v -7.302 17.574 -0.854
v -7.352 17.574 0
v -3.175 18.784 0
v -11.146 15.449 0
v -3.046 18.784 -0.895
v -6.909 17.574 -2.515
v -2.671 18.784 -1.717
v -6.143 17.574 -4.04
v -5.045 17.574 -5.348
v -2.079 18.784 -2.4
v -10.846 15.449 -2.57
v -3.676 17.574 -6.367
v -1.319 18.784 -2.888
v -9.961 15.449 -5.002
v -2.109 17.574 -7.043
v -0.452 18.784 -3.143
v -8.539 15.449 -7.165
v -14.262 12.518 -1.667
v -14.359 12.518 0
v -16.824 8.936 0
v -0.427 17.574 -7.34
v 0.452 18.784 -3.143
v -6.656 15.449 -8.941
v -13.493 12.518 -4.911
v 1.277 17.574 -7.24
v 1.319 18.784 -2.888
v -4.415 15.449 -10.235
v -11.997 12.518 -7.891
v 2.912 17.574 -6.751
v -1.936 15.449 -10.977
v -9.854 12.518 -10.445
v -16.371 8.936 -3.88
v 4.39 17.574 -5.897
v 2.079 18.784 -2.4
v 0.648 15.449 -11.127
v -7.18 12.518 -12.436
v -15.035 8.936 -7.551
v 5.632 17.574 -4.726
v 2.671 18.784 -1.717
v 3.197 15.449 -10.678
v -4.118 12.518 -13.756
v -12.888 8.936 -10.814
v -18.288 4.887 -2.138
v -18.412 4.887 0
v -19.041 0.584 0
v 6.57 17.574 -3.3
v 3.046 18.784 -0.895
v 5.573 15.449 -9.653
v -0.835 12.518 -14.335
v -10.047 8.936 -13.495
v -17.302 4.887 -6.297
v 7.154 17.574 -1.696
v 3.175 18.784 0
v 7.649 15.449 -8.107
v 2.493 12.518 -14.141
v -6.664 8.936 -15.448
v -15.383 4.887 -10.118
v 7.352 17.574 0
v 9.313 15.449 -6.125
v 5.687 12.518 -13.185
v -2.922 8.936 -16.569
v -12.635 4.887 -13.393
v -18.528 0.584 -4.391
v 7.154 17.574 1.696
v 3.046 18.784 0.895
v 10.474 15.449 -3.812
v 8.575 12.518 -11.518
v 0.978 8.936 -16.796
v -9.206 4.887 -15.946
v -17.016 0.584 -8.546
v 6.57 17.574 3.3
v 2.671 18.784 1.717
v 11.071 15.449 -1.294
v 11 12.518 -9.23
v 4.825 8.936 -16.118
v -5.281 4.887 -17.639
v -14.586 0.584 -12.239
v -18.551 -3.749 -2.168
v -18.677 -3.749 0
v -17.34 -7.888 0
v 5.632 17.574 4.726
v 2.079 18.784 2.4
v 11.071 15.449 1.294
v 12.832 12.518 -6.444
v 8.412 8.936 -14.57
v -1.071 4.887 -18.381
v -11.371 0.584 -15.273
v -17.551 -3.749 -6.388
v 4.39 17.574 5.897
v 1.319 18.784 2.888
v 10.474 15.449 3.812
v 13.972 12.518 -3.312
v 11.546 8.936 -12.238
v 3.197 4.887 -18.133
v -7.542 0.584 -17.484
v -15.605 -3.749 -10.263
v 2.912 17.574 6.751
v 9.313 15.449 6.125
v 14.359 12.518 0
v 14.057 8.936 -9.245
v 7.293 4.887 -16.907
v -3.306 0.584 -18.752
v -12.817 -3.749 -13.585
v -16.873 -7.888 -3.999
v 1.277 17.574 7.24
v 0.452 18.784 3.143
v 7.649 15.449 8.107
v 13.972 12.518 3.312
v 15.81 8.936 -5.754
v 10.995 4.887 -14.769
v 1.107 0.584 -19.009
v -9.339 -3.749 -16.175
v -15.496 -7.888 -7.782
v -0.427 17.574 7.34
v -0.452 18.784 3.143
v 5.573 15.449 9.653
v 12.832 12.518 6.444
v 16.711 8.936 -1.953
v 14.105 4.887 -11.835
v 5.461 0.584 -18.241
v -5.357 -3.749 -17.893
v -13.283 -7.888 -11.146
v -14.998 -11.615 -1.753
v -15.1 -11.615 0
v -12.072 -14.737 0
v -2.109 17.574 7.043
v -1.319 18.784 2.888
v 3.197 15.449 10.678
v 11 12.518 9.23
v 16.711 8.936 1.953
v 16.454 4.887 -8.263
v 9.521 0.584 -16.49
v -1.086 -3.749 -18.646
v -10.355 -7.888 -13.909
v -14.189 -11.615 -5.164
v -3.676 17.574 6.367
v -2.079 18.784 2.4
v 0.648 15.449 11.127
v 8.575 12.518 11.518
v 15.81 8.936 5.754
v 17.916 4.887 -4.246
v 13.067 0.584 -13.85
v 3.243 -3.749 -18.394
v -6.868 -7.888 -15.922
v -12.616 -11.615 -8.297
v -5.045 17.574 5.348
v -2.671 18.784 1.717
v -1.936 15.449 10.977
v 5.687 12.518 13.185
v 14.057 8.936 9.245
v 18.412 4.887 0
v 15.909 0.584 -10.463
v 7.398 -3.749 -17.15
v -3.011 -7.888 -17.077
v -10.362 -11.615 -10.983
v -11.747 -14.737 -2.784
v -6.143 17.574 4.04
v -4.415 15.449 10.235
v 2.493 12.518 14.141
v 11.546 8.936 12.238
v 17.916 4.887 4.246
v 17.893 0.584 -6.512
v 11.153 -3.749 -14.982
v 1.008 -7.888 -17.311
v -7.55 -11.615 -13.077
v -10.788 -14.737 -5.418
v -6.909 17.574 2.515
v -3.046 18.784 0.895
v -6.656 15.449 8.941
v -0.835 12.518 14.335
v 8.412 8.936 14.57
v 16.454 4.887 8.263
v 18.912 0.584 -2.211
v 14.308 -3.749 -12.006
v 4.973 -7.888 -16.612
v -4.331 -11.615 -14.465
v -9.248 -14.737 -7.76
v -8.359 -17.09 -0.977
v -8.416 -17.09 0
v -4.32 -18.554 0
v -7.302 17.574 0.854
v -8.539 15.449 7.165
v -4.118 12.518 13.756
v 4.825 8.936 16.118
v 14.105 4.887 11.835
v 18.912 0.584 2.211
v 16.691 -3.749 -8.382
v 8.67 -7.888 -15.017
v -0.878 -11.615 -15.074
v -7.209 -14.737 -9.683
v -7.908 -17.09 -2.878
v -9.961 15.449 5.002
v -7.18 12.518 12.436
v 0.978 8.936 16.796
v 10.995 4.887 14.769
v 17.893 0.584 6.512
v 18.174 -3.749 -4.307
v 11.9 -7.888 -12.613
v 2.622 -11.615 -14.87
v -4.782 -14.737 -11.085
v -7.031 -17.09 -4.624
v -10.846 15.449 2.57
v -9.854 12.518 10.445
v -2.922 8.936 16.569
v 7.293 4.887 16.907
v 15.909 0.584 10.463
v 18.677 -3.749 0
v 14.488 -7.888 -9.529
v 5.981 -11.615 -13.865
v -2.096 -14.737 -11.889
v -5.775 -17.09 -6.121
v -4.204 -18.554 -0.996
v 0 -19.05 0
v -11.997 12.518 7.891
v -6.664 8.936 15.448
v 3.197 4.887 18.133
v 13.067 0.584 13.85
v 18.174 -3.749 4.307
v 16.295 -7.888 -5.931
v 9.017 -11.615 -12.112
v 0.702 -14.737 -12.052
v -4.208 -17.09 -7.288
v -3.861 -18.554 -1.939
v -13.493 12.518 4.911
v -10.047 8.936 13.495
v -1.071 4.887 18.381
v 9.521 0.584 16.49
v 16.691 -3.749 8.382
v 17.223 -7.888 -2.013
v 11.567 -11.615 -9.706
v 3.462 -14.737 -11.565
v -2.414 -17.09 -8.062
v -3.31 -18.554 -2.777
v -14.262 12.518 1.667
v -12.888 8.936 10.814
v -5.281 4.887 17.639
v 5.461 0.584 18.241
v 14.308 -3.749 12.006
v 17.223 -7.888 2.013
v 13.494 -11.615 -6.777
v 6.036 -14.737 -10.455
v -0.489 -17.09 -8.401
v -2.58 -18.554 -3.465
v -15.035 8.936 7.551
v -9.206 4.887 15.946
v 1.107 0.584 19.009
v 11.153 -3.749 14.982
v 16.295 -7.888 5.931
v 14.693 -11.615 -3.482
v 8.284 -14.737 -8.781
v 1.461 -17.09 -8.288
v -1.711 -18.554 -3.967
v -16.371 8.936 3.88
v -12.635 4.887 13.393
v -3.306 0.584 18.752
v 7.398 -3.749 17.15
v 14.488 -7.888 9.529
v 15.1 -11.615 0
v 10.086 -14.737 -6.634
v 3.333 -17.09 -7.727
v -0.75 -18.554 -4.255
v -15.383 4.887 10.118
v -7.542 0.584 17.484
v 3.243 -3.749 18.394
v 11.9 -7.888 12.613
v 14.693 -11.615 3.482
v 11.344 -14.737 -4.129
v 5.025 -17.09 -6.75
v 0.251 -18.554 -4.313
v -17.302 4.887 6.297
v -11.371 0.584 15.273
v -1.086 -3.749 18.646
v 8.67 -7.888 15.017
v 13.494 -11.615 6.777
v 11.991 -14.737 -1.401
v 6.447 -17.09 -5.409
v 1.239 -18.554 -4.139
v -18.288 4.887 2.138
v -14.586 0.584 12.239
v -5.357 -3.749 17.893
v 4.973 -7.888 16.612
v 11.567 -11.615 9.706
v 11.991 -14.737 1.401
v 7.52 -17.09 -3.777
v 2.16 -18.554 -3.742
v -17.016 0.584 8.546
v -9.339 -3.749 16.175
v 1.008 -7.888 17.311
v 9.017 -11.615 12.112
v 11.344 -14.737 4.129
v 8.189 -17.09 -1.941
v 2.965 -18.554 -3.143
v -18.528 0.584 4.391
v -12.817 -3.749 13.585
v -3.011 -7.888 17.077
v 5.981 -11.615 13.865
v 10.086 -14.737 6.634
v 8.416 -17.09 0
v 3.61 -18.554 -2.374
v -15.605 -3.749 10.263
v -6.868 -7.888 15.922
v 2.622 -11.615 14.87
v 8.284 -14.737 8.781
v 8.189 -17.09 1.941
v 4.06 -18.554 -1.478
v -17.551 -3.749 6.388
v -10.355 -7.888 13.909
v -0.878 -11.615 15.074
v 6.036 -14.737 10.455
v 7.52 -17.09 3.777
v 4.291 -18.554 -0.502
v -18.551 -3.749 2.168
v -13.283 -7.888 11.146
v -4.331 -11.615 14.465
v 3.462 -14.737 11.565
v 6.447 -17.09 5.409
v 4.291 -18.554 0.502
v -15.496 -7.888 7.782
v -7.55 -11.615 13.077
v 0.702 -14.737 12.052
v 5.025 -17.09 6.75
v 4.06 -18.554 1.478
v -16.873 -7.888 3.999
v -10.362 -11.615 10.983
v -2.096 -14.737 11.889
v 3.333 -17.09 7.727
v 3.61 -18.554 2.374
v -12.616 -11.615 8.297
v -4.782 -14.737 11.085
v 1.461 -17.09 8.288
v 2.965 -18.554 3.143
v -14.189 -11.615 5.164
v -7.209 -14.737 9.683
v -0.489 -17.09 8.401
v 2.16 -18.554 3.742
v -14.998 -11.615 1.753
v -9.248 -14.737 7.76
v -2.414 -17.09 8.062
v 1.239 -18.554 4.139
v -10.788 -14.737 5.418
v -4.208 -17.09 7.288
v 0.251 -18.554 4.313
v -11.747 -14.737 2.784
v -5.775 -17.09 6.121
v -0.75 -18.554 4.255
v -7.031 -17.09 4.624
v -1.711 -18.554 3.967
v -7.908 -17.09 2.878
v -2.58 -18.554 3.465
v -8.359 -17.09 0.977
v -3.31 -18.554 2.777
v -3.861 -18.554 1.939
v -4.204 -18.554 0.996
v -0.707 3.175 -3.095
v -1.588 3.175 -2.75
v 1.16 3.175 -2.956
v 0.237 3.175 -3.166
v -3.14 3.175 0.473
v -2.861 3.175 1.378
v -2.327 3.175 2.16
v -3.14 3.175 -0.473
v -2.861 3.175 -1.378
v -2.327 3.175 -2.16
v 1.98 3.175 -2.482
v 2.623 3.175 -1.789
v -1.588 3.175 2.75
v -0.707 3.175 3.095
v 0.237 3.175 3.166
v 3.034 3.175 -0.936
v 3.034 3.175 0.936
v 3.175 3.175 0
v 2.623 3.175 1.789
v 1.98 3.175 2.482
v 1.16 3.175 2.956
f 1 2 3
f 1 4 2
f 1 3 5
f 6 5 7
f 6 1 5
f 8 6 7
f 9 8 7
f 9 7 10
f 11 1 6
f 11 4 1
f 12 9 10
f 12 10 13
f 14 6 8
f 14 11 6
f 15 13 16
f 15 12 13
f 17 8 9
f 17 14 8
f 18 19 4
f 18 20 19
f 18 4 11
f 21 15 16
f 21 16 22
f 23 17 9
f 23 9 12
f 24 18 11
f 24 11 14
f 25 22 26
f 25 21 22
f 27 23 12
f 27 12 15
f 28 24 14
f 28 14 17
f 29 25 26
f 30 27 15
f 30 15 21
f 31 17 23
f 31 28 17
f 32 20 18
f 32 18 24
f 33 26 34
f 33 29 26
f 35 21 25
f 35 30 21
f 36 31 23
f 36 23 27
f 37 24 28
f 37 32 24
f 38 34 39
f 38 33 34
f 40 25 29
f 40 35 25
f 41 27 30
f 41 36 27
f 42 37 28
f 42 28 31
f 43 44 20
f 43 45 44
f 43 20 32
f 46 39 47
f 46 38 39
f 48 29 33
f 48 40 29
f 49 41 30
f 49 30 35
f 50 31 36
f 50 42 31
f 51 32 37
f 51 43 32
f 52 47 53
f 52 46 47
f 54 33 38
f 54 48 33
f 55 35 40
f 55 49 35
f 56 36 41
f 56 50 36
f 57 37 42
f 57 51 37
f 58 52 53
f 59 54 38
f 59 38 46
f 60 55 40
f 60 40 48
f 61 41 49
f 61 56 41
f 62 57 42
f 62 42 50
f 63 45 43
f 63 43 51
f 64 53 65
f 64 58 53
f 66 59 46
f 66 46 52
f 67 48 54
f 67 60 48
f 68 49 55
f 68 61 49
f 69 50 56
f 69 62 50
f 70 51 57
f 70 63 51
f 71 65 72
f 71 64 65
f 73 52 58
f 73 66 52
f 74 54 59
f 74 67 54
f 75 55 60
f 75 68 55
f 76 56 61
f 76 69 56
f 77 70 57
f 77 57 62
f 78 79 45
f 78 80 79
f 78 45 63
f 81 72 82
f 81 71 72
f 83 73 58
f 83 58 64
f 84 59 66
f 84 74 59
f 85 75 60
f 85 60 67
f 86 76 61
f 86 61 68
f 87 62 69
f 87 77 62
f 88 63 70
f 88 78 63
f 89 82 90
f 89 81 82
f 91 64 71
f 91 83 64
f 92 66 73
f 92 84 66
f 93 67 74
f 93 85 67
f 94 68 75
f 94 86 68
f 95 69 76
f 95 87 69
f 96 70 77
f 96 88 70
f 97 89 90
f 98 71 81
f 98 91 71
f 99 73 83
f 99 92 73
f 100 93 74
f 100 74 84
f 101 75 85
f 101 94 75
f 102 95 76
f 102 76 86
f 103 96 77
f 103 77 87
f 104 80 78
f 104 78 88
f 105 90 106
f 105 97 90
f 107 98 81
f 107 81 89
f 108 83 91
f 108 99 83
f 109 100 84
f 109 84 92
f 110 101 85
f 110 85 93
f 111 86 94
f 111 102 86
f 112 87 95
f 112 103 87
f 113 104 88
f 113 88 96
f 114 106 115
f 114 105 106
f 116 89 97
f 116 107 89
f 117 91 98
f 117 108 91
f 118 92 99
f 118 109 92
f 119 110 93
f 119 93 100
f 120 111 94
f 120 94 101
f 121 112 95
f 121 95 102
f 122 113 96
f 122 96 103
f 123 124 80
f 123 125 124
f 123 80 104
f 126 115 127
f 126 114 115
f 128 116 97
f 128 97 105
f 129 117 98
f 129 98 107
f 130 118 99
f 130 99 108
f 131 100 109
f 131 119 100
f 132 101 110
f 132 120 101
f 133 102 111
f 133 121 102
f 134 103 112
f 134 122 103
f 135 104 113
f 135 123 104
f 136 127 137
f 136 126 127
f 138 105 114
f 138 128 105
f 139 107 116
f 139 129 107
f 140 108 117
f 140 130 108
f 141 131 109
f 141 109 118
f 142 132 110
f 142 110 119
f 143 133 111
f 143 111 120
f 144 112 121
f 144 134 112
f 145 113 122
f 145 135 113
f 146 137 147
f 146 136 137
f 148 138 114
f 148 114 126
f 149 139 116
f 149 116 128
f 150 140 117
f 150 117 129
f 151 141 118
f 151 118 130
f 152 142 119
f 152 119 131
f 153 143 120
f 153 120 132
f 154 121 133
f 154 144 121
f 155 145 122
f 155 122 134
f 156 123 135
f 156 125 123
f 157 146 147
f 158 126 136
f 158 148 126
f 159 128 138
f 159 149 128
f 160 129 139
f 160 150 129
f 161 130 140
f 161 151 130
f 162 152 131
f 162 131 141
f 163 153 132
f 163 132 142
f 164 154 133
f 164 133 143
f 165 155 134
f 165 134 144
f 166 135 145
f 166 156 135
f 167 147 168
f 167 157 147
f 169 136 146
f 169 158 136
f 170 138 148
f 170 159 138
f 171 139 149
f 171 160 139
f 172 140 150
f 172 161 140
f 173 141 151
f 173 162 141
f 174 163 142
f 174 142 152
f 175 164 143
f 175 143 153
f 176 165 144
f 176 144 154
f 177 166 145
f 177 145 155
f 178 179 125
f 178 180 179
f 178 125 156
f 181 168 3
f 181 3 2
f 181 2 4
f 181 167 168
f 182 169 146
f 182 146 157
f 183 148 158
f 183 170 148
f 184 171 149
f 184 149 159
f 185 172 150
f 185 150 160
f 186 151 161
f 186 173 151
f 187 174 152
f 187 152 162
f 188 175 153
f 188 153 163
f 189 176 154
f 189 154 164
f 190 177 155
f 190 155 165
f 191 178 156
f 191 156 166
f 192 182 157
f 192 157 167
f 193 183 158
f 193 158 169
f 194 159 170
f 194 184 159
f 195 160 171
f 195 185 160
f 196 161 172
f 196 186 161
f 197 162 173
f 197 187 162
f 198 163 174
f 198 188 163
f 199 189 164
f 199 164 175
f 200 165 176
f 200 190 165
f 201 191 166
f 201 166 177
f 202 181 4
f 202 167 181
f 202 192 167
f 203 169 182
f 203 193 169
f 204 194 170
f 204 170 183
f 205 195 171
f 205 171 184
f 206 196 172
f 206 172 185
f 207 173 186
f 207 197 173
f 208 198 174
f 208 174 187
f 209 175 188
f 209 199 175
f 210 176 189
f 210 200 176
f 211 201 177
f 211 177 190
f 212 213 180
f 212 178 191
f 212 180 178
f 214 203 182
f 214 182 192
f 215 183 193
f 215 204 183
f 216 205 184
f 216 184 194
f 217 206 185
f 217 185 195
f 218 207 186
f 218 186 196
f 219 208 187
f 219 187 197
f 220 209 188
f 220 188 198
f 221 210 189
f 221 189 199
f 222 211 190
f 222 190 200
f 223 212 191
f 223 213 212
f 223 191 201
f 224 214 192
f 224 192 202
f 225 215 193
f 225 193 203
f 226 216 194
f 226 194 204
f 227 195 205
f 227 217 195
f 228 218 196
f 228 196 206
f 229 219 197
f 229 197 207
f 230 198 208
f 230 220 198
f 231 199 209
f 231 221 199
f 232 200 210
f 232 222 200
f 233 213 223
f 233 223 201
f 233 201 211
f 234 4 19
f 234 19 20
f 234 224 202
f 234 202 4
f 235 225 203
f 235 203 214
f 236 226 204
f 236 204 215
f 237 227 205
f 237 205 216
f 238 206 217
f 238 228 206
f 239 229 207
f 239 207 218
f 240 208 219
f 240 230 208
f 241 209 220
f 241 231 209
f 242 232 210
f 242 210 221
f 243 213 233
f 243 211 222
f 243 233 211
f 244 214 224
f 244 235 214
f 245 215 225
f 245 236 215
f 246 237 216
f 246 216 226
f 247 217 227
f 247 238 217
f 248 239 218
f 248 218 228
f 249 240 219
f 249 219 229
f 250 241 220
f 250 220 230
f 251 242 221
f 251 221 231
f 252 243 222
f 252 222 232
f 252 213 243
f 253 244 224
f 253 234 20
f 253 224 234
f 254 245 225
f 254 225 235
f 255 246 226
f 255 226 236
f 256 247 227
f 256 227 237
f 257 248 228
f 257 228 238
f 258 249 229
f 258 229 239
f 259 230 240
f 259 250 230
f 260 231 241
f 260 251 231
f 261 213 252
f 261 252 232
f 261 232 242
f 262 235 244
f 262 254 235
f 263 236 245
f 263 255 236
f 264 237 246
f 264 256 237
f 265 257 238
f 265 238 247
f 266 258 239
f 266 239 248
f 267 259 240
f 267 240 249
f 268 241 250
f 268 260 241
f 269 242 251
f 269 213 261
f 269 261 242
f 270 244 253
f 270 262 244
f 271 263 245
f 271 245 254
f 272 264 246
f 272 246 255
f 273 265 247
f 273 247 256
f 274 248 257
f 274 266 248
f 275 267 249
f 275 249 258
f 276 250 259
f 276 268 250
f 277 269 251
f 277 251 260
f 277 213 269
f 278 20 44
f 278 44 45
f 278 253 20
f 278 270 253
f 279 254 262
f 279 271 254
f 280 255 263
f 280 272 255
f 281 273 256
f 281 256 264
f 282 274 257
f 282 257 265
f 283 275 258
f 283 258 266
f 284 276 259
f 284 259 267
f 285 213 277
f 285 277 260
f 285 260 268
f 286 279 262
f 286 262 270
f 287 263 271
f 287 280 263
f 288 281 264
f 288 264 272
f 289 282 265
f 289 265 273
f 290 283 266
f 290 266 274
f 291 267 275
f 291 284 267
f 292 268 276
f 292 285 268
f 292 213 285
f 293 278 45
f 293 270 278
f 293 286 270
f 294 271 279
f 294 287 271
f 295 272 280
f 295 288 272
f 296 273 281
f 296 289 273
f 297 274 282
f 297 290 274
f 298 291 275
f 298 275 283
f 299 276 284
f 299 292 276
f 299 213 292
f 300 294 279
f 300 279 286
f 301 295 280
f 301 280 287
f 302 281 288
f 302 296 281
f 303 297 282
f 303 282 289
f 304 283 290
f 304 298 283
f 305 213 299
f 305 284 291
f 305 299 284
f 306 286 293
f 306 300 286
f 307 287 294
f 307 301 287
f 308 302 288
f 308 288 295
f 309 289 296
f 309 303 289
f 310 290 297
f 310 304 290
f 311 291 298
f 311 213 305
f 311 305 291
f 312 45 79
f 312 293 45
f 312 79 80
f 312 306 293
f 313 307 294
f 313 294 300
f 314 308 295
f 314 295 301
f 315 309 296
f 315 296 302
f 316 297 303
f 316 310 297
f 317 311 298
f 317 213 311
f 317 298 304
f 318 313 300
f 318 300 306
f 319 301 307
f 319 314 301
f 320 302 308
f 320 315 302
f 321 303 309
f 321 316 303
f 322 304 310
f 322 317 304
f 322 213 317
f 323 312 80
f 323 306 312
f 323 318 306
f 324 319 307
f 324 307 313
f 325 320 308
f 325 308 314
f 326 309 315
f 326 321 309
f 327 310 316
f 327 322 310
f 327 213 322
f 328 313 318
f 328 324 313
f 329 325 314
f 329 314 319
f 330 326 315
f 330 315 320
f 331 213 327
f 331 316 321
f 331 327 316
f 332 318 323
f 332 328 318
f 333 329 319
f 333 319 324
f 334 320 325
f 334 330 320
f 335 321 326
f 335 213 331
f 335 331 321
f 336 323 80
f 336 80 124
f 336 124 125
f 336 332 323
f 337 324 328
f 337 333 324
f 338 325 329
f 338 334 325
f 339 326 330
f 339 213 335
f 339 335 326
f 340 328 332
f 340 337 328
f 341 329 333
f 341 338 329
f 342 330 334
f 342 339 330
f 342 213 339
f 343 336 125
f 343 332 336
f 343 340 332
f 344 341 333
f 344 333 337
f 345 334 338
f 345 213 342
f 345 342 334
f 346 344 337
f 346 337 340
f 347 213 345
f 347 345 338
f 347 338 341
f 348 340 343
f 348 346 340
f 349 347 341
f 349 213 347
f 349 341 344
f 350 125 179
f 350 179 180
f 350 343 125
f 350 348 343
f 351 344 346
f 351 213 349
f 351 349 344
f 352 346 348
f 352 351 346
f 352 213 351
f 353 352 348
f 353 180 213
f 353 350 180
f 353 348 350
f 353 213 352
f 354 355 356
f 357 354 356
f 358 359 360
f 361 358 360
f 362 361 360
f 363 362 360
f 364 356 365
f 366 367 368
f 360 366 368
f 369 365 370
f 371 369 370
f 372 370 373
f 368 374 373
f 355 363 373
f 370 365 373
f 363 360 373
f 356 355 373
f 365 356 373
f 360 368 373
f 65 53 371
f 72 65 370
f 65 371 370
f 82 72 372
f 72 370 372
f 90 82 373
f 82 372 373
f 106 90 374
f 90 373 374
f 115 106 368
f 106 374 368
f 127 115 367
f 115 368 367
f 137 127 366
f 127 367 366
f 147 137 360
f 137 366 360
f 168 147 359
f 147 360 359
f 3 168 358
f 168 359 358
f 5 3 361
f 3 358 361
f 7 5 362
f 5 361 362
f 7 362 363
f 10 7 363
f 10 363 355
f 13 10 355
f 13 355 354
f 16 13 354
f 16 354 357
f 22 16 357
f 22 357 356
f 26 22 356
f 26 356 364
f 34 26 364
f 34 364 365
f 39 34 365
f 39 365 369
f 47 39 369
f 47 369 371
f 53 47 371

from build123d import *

# Parameters (mm, degrees)
F4_R     = 3.175
F5_DEPTH = 76.2


with BuildPart() as f2:
    # F1 (on Top) → F2 (revolve)
    with BuildSketch(Plane.XY):
        with BuildLine():
            Line((0, -19.05), (0, 19.05))
            ThreePointArc((0, 19.05), (-19.05, 0), (0, -19.05))
        make_face()
    revolve(axis=Axis((0, 0, 0), (0, -1, 0)))


with BuildPart() as f5:
    # F4 (on offset) → F5 (new body)
    with BuildSketch(Plane.XZ.offset(-3.175)):
        Circle(F4_R)
    extrude(amount=-F5_DEPTH)


with BuildPart() as f2_1:
    add(f2.part)

    # F6: cut F5
    add(f5.part, mode=Mode.SUBTRACT)


solid = f2_1.part
